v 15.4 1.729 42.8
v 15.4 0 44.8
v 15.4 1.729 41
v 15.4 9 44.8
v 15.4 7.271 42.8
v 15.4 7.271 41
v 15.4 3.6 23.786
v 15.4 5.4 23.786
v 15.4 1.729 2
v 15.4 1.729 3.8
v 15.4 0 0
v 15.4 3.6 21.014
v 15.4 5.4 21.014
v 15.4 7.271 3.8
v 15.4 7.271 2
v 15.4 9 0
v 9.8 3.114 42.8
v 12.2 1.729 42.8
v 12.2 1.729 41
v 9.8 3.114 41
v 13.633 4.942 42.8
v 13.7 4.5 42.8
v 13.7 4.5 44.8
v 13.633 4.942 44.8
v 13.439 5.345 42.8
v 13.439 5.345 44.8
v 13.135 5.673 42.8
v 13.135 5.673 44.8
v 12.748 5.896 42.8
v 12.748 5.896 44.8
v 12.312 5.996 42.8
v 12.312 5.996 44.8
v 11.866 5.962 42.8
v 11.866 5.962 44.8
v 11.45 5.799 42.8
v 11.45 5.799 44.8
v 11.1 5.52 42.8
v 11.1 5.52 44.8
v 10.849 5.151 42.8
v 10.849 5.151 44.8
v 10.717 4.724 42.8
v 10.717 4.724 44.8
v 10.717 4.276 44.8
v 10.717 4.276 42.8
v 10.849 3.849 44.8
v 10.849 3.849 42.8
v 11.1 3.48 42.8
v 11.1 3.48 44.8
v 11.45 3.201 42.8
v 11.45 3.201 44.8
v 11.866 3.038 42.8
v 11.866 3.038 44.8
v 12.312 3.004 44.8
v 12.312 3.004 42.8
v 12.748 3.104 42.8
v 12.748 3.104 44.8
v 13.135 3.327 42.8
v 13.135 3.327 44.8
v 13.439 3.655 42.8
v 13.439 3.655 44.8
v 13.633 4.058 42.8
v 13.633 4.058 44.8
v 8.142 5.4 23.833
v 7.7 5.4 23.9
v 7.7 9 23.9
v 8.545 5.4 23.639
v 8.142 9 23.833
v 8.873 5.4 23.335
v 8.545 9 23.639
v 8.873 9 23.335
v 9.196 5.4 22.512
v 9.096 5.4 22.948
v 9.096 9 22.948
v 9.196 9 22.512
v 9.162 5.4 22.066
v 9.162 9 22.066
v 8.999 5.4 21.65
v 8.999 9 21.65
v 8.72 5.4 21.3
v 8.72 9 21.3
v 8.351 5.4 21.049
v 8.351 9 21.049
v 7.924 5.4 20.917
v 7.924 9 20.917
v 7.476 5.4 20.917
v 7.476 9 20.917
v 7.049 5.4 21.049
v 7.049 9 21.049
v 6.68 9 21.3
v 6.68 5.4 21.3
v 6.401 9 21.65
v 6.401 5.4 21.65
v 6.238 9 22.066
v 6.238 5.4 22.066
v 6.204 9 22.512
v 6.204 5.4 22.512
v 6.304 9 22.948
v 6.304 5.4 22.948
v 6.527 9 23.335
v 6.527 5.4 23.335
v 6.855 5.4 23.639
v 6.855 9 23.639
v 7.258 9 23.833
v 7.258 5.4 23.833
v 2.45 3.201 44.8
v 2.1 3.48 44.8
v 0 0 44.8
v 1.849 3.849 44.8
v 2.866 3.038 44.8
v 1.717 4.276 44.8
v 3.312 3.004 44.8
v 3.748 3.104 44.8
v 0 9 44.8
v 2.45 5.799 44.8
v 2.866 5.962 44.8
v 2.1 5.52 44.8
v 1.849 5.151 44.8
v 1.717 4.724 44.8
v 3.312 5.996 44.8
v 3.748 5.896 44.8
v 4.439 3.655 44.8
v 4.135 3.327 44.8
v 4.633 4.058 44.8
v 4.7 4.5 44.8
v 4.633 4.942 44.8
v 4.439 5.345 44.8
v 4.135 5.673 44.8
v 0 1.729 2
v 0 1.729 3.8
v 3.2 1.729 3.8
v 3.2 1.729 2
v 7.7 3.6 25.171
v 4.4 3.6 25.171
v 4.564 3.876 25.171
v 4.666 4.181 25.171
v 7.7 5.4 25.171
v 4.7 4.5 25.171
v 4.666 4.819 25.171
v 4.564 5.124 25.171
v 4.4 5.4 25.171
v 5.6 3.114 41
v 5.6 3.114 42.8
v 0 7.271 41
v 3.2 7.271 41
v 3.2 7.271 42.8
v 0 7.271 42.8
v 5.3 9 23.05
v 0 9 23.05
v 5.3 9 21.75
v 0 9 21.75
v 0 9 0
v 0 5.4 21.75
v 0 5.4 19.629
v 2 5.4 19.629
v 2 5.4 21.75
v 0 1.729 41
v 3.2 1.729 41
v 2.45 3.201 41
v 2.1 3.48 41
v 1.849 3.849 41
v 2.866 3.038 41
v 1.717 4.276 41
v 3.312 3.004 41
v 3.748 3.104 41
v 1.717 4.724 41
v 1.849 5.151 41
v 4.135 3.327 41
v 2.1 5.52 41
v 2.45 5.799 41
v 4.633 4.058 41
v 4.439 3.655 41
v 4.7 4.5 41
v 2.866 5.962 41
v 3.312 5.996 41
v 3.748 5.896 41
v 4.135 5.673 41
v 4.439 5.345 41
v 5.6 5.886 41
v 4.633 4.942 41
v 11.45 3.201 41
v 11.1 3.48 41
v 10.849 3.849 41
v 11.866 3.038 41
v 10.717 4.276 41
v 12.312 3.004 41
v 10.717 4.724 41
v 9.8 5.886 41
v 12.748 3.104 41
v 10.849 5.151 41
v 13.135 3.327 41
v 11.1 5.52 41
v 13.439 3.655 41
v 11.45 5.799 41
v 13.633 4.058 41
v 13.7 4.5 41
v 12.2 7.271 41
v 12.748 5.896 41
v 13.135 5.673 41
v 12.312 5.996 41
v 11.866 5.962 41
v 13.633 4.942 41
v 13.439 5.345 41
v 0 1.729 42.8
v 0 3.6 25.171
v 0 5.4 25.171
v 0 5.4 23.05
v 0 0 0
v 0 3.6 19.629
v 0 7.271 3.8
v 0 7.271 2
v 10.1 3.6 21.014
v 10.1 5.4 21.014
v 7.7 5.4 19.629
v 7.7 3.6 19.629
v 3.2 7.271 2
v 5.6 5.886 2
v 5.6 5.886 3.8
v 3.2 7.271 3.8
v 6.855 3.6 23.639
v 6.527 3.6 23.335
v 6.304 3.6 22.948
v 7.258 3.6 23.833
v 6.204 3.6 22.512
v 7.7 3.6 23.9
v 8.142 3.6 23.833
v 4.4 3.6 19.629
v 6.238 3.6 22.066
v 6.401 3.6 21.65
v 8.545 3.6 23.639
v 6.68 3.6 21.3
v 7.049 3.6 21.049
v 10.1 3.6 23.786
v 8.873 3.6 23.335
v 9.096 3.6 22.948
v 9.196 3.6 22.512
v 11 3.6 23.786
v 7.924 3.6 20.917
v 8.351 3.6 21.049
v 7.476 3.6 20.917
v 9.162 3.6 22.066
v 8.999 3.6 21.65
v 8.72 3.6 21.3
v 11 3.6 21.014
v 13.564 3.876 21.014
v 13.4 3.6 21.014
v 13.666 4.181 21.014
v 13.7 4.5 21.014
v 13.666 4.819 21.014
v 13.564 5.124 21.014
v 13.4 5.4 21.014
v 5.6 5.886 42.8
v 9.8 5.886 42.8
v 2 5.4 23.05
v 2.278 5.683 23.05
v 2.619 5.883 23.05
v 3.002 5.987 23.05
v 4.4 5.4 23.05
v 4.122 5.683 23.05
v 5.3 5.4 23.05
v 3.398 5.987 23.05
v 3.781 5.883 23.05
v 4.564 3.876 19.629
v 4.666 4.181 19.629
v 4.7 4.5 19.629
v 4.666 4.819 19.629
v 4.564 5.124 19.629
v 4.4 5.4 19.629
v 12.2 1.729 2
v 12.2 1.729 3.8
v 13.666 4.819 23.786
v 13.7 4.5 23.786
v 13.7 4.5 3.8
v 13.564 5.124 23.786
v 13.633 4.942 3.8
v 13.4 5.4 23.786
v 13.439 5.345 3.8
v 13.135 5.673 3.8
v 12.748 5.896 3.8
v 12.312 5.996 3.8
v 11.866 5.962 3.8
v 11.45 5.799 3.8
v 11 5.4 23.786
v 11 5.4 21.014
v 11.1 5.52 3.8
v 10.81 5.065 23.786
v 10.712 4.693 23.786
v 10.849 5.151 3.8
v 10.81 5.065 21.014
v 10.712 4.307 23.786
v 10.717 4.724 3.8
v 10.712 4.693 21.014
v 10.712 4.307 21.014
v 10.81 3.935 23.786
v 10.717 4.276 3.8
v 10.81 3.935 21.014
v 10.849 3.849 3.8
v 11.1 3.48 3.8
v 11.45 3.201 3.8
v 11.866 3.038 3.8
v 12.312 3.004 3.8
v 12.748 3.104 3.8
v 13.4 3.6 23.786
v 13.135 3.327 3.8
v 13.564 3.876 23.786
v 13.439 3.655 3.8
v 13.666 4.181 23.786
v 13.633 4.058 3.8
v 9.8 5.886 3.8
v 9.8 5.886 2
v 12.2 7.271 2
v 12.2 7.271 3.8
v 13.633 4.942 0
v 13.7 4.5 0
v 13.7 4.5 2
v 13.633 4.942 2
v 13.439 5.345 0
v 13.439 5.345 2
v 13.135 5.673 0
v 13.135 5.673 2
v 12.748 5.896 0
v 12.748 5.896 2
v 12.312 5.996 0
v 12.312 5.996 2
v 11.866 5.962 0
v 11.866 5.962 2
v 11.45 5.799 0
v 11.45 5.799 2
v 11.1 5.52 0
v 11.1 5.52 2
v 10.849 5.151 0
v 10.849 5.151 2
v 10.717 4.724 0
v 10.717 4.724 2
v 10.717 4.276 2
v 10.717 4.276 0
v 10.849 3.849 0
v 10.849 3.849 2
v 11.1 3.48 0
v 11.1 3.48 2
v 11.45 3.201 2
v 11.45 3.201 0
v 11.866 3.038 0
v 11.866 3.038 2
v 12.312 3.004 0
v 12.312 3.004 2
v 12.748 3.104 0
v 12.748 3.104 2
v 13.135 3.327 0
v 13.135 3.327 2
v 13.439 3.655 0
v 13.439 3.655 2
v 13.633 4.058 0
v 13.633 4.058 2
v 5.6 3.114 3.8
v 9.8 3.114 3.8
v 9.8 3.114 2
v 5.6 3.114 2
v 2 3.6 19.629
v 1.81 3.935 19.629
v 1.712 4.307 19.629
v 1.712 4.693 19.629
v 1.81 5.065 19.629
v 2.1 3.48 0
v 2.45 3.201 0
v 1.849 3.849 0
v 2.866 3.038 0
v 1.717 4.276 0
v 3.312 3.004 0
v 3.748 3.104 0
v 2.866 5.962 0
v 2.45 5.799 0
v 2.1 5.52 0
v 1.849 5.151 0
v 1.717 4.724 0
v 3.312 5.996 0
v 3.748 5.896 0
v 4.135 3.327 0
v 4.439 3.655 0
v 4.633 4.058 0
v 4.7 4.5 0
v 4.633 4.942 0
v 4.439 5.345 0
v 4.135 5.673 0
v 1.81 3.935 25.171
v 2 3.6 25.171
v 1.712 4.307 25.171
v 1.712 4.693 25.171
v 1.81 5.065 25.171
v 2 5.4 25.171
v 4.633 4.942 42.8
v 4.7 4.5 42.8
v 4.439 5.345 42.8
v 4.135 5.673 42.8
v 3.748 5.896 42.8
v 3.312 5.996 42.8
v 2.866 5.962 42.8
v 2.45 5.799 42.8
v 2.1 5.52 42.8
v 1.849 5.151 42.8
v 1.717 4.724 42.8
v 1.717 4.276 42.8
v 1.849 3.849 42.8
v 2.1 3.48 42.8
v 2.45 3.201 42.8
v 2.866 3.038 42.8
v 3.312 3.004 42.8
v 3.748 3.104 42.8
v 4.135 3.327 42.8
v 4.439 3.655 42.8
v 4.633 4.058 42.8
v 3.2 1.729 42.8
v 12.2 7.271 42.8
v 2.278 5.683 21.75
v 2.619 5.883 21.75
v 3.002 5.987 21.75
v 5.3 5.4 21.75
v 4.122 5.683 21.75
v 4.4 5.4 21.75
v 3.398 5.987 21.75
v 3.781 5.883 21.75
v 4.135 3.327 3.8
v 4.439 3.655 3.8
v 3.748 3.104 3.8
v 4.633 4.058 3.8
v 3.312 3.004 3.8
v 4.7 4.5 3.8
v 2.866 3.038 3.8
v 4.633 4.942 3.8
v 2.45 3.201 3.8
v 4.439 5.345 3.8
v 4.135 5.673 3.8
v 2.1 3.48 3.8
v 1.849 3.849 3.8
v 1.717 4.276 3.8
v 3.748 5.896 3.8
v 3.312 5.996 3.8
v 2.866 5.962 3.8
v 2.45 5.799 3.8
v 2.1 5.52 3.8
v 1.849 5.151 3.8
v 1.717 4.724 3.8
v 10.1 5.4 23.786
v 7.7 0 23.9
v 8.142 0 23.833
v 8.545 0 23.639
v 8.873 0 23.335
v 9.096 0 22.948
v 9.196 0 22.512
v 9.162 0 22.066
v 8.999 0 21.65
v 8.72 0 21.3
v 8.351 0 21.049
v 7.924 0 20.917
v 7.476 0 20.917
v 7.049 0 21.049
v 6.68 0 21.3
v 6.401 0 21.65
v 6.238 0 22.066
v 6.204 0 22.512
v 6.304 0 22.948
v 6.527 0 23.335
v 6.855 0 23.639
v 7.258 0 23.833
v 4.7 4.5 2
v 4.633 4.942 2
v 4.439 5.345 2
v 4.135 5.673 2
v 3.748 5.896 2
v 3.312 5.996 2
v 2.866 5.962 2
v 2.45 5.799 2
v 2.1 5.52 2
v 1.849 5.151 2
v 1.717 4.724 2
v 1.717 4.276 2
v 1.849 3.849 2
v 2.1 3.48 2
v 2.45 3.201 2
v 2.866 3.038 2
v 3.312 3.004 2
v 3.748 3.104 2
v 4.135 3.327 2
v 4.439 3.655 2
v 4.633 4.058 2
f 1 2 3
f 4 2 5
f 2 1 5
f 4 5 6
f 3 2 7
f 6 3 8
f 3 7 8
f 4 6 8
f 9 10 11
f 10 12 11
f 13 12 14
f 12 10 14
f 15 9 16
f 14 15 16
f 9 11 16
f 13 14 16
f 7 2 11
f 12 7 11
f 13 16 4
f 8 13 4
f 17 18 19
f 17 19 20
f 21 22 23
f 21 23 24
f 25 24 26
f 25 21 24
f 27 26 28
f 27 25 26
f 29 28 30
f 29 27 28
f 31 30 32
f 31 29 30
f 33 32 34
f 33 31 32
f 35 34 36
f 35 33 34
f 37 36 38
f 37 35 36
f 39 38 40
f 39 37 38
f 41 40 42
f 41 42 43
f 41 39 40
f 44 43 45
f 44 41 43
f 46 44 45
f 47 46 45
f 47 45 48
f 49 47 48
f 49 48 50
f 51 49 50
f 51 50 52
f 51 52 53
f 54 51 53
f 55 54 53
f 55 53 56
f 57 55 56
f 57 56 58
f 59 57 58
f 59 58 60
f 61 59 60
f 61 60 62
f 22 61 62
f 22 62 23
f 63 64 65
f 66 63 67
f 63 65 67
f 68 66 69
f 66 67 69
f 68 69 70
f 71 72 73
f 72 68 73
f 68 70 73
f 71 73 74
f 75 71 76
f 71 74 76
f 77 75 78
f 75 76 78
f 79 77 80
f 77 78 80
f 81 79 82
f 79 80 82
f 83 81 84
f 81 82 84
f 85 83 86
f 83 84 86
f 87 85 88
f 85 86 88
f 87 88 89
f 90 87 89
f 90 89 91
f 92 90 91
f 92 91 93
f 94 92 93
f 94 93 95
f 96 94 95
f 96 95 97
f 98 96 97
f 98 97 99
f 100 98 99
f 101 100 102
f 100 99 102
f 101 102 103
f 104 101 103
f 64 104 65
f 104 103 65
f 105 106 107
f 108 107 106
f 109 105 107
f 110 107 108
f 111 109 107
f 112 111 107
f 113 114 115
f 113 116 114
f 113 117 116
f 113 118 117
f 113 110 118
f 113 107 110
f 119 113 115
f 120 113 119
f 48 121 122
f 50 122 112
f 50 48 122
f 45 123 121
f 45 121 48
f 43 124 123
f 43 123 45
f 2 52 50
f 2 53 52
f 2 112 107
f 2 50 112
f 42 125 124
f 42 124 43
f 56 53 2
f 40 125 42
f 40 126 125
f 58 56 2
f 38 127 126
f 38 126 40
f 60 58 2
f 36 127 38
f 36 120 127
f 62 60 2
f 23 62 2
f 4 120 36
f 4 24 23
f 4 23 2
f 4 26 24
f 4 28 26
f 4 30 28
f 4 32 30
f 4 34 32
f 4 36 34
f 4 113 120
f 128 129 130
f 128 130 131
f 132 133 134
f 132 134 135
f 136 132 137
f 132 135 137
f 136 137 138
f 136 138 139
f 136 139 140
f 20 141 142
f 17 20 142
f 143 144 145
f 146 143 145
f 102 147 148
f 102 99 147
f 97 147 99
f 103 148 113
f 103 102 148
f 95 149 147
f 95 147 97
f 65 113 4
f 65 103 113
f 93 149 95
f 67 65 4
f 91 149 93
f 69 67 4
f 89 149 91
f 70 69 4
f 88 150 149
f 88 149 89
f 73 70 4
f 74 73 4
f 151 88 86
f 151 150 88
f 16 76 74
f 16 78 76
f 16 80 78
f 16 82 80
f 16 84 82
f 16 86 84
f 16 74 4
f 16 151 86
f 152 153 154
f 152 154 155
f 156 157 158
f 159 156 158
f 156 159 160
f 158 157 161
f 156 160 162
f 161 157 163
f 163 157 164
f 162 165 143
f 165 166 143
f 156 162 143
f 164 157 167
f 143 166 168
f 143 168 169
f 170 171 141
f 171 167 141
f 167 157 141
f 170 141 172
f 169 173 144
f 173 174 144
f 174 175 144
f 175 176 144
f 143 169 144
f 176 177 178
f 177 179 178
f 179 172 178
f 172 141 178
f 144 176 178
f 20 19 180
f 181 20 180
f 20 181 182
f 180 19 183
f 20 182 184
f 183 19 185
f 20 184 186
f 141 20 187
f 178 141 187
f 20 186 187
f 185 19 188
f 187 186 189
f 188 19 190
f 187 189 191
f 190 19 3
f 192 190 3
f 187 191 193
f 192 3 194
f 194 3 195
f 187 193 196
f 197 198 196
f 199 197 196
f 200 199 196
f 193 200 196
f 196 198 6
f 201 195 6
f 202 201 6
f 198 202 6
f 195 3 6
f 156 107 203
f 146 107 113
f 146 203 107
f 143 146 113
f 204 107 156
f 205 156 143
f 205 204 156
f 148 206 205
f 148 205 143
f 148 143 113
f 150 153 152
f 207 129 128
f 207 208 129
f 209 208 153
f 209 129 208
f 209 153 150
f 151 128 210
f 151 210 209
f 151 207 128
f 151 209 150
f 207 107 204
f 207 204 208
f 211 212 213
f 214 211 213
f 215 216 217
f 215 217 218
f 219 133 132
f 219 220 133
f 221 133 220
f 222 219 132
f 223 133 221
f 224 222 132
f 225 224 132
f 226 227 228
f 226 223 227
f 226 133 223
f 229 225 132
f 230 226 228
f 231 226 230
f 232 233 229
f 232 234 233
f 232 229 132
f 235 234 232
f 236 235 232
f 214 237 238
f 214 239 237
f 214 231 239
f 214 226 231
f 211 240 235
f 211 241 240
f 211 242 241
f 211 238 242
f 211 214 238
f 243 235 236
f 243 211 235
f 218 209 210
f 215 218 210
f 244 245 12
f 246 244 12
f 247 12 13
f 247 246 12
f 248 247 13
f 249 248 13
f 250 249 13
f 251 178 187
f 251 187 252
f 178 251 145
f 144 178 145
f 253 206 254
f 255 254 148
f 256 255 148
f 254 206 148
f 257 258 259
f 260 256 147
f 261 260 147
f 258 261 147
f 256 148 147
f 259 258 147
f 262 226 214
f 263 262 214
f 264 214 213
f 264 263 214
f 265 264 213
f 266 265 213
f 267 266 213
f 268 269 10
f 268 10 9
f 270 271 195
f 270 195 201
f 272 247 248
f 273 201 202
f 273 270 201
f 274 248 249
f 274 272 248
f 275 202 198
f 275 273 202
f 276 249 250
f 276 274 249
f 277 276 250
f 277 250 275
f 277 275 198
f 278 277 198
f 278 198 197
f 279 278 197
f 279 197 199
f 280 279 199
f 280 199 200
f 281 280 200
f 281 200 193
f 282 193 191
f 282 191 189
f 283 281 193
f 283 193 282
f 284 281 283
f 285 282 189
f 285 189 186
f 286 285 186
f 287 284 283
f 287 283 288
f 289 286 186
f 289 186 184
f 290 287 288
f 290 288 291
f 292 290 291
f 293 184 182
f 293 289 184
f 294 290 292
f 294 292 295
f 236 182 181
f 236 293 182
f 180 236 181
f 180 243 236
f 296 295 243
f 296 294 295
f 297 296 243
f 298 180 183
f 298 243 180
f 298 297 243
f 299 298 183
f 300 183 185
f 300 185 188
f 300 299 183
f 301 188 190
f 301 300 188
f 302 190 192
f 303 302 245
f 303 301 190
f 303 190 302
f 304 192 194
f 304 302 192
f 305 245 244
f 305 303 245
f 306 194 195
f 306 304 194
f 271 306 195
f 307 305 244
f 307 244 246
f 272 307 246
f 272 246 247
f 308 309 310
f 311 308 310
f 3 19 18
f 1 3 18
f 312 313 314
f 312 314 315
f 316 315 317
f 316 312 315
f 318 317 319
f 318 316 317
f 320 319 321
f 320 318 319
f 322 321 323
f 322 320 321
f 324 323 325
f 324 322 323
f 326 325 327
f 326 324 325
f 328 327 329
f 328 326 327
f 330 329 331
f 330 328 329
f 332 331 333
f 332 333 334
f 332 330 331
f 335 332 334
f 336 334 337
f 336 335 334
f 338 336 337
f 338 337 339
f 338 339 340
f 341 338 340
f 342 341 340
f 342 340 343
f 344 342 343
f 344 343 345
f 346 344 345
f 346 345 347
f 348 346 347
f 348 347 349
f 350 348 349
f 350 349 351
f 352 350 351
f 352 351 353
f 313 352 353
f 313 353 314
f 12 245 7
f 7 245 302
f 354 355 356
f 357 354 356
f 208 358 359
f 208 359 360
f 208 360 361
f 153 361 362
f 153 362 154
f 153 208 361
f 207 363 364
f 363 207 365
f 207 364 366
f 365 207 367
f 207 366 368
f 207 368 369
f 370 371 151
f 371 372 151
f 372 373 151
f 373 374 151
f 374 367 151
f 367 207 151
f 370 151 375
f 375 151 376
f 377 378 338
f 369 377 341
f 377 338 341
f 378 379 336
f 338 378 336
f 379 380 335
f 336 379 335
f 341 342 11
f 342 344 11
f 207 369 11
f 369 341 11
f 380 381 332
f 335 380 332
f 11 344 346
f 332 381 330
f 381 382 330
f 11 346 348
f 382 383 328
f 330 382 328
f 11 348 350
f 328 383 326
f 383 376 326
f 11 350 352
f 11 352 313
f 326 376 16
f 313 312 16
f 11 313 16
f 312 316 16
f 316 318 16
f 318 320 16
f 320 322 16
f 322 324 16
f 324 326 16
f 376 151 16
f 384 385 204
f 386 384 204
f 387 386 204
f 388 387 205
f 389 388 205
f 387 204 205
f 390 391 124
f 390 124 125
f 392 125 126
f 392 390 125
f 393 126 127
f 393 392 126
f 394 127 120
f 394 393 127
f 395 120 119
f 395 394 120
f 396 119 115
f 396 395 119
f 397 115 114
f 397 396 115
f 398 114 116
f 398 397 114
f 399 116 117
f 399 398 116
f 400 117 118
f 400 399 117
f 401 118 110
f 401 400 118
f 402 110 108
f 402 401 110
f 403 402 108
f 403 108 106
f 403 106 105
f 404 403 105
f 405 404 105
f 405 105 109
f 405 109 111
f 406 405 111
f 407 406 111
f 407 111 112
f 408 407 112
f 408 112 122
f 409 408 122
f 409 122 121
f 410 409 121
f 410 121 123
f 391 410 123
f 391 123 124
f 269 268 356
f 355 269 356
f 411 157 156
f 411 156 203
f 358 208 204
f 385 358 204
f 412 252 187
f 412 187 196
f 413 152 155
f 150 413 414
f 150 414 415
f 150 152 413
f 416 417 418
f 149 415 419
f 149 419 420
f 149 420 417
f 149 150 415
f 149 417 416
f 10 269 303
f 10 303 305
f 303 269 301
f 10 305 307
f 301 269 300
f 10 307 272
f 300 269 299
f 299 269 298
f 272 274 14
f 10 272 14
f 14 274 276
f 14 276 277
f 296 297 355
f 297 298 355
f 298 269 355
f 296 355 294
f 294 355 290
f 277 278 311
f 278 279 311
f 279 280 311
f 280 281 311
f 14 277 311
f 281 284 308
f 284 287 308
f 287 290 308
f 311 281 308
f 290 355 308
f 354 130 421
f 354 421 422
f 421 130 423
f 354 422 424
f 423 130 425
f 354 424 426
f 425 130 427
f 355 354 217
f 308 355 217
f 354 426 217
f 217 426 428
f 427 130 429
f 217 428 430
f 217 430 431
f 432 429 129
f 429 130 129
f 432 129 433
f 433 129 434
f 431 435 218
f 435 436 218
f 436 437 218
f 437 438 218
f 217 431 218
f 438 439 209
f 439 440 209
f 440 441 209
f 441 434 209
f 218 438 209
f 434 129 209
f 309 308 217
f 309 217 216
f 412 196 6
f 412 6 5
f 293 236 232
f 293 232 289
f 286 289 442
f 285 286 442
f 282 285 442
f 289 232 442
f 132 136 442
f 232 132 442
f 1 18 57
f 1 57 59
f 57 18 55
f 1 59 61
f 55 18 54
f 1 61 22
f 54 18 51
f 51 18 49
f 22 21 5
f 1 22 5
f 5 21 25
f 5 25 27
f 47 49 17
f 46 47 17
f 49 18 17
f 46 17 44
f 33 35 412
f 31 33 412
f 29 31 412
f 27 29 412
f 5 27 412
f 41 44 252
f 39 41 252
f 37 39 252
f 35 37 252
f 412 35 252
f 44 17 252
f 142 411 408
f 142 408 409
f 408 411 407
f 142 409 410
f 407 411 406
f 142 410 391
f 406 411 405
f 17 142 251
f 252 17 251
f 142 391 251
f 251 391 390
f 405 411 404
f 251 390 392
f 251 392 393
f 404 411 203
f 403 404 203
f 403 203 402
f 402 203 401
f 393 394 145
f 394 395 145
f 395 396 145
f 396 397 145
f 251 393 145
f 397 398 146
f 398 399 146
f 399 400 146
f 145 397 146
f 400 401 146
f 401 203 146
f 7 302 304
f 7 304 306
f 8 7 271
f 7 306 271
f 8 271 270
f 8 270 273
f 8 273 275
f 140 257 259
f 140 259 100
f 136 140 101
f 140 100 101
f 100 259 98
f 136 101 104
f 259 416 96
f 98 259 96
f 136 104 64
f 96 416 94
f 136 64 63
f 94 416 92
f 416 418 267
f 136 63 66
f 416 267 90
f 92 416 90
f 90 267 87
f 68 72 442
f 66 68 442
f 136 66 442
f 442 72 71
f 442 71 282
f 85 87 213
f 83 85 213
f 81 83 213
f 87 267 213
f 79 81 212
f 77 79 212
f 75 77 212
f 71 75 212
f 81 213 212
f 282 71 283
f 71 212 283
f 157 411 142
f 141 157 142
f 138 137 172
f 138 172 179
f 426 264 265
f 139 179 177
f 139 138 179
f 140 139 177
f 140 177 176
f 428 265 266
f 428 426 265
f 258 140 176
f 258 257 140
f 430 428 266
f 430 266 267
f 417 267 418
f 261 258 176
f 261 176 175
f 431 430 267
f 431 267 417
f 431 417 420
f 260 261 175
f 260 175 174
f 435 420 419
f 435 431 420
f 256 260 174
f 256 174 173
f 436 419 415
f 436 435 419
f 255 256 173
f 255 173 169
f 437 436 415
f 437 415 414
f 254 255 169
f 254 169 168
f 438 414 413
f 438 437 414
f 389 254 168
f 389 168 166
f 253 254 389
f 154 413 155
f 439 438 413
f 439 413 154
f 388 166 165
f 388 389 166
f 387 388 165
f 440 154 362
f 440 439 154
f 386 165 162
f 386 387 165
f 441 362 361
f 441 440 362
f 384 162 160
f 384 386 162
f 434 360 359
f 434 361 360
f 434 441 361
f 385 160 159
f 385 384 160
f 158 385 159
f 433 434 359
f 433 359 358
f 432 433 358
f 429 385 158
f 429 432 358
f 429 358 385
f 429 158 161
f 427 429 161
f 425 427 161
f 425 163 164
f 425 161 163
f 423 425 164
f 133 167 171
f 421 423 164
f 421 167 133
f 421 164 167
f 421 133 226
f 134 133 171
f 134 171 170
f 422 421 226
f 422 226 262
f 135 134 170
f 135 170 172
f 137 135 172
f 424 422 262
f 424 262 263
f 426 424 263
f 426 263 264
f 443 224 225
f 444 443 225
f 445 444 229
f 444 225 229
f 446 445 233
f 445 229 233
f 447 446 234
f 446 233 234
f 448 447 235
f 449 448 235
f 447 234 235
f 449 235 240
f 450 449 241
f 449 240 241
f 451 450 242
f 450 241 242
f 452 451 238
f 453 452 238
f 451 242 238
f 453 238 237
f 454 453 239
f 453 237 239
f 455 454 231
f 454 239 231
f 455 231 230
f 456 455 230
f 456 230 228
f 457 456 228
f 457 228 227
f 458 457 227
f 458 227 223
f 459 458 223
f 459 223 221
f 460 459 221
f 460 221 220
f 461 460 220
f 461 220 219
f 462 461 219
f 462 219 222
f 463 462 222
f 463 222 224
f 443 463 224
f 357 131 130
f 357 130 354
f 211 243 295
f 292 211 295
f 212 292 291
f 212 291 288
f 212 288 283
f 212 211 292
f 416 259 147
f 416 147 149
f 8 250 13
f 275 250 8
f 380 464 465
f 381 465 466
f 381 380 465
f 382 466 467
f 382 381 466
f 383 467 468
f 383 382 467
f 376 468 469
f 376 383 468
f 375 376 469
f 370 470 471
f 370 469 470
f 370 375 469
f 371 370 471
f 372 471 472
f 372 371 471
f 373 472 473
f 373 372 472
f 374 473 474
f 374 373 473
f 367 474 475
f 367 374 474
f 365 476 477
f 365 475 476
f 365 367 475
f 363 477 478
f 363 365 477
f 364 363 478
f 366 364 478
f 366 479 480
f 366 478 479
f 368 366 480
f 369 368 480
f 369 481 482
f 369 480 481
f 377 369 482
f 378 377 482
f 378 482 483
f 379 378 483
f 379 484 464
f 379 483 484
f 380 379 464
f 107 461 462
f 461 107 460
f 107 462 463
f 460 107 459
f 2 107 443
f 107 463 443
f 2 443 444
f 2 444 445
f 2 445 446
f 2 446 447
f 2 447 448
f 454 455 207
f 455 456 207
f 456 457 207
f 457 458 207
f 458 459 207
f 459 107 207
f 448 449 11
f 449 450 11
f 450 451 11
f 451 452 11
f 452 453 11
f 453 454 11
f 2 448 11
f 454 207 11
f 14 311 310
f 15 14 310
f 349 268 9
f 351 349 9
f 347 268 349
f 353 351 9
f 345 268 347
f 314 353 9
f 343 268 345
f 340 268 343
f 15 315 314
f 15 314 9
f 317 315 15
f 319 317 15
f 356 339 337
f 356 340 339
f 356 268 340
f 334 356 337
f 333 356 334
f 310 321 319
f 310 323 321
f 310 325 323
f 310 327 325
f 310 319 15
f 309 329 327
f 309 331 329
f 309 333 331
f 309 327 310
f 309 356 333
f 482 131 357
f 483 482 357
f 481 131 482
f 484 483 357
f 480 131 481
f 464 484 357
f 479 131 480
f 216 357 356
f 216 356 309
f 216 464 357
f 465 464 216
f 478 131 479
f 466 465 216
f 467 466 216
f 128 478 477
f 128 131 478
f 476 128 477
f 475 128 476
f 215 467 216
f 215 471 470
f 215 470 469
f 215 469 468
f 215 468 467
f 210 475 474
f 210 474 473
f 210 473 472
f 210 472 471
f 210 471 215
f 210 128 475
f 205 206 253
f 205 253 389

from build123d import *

# Parameters (mm, degrees)
SKETCH1_W               = 15.4
SKETCH1_H               = 9
SKETCH1_R               = 1.5
BOSS_EXTRUDE1_DEPTH     = 44.8
CUT_EXTRUDE1_DEPTH      = 1.8
SKETCH3_R               = 1.5
CUT_EXTRUDE2_DEPTH      = 49.220327664
CUT_EXTRUDE3_DEPTH      = 1.8
SKETCH6_W               = 5.542562584
SKETCH6_H               = 1.8
CUT_EXTRUDE4_DEPTH      = 7.7
CUT_EXTRUDE5_REACH      = 50.22
SKETCH7_W               = 5.3
SKETCH7_H               = 1.3
SKETCH8_W               = 2.771281292
SKETCH8_H               = 1.8
CUT_EXTRUDE6_DEPTH      = 47.797970041
SKETCH10_W              = 1.8
SKETCH10_H              = 5.542562584
CUT_EXTRUDE7_DEPTH      = 3.2
SKETCH11_W              = 1.8
SKETCH11_H              = 2.771281292
CUT_EXTRUDE8_DEPTH      = 47.734141695
MIRROR3_COPY_1_SKETCH_W = 1.8
MIRROR3_COPY_1_SKETCH_H = 5.542562584
MIRROR3_COPY_1_DEPTH    = 3.2


with BuildPart() as part:
    # Sketch1 → Boss-Extrude1 (new body)
    with BuildSketch(Plane.XY):
        with Locations((7.7, 4.5)):
            Rectangle(SKETCH1_W, SKETCH1_H)
        with Locations((3.2, 4.5)):
            Circle(SKETCH1_R, mode=Mode.SUBTRACT)
        with Locations((12.2, 4.5)):
            Circle(SKETCH1_R, mode=Mode.SUBTRACT)
    extrude(amount=BOSS_EXTRUDE1_DEPTH)

    # Sketch2 → Cut-Extrude1 (cut)
    with BuildSketch(Plane(origin=(0, 0, 2), x_dir=(-1, 0, 0), z_dir=(0, 0, -1))):
        Polygon((-0.8, 3.114359354), (-3.2, 1.728718708), (-5.6, 3.114359354), (-5.6, 5.885640646), (-3.2, 7.271281292), (-0.8, 5.885640646), align=None)
        Polygon((-12.2, 1.728718708), (-9.8, 3.114359354), (-9.8, 5.885640646), (-12.2, 7.271281292), (-14.6, 5.885640646), (-14.6, 3.114359354), align=None)
    cut_extrude1 = extrude(amount=-CUT_EXTRUDE1_DEPTH, mode=Mode.SUBTRACT)

    # Mirror1: Cut-Extrude1 across plane
    add(cut_extrude1.mirror(Plane(origin=(0, 0, 22.4), x_dir=(1, 0, 0), z_dir=(0, 0, -1))), mode=Mode.SUBTRACT)

    # Sketch3 → Cut-Extrude2 (cut, through all)
    with BuildSketch(Plane(origin=(0, 9, 0), x_dir=(1, 0, 0), z_dir=(0, 1, 0))):
        with Locations(Location((7.7, -22.4, 0), (0, 0, 270))):
            Circle(SKETCH3_R)
    extrude(amount=-CUT_EXTRUDE2_DEPTH, mode=Mode.SUBTRACT)

    # Sketch4 → Cut-Extrude3 (cut)
    with BuildSketch(Plane(origin=(0, 5.4, 0), x_dir=(1, 0, 0), z_dir=(0, 1, 0))):
        Polygon((7.7, -19.628718708), (5.3, -21.014359354), (5.3, -23.785640646), (7.7, -25.171281292), (10.1, -23.785640646), (10.1, -21.014359354), align=None)
    extrude(amount=-CUT_EXTRUDE3_DEPTH, mode=Mode.SUBTRACT)

    # Sketch6 → Cut-Extrude4 (cut)
    with BuildSketch(Plane.ZY):
        with Locations((22.4, 4.5)):
            Rectangle(SKETCH6_W, SKETCH6_H)
    extrude(amount=-CUT_EXTRUDE4_DEPTH, mode=Mode.SUBTRACT)

    # Sketch7 → Cut-Extrude5 (cut, up to next)
    with BuildSketch(Plane(origin=(0, 9, 0), x_dir=(1, 0, 0), z_dir=(0, 1, 0)), mode=Mode.PRIVATE) as cut_extrude5_sk1:
        with Locations((2.65, -22.4)):
            Rectangle(SKETCH7_W, SKETCH7_H)
    cut_extrude5_tool1 = extrude(cut_extrude5_sk1.sketch, amount=-CUT_EXTRUDE5_REACH, mode=Mode.PRIVATE) & part.part
    add(cut_extrude5_tool1.solids().sort_by_distance((2.65, 9, 22.4))[0], mode=Mode.SUBTRACT)

    # Sketch8 → Cut-Extrude6 (cut, through all)
    with BuildSketch(Plane.ZY.offset(-10.1)):
        with Locations((22.4, 4.5)):
            Rectangle(SKETCH8_W, SKETCH8_H)
    extrude(amount=-CUT_EXTRUDE6_DEPTH, mode=Mode.SUBTRACT)

    # Sketch10 → Cut-Extrude7 (cut)
    with BuildSketch(Plane(origin=(15.4, 0, 0), x_dir=(0, 0, -1), z_dir=(1, 0, 0))):
        with Locations((-2.9, 4.5)):
            Rectangle(SKETCH10_W, SKETCH10_H)
    cut_extrude7 = extrude(amount=-CUT_EXTRUDE7_DEPTH, mode=Mode.SUBTRACT)

    # Mirror2: Cut-Extrude7 across plane
    add(cut_extrude7.mirror(Plane(origin=(7.7, 0, 0), x_dir=(0, 0, 1), z_dir=(1, 0, 0))), mode=Mode.SUBTRACT)

    # Sketch11 → Cut-Extrude8 (cut, through all)
    with BuildSketch(Plane(origin=(9.8, 0, 0), x_dir=(0, 0, -1), z_dir=(1, 0, 0))):
        with Locations((-2.9, 4.5)):
            Rectangle(SKETCH11_W, SKETCH11_H)
    cut_extrude8 = extrude(amount=-CUT_EXTRUDE8_DEPTH, mode=Mode.SUBTRACT)

    # Mirror3: Cut-Extrude7, Cut-Extrude8 across plane
    add(cut_extrude7.mirror(Plane(origin=(0, 0, 22.4), x_dir=(1, 0, 0), z_dir=(0, 0, -1))), mode=Mode.SUBTRACT)
    add(cut_extrude8.mirror(Plane(origin=(0, 0, 22.4), x_dir=(1, 0, 0), z_dir=(0, 0, -1))), mode=Mode.SUBTRACT)

    # Mirror3 copy 1 sketch → Mirror3 copy 1 (cut)
    with BuildSketch(Plane(origin=(0, 0, 44.8), x_dir=(0, 0, 1), z_dir=(-1, 0, 0))):
        with Locations((-2.9, 4.5)):
            Rectangle(MIRROR3_COPY_1_SKETCH_W, MIRROR3_COPY_1_SKETCH_H)
    extrude(amount=-MIRROR3_COPY_1_DEPTH, mode=Mode.SUBTRACT)


solid = part.part
